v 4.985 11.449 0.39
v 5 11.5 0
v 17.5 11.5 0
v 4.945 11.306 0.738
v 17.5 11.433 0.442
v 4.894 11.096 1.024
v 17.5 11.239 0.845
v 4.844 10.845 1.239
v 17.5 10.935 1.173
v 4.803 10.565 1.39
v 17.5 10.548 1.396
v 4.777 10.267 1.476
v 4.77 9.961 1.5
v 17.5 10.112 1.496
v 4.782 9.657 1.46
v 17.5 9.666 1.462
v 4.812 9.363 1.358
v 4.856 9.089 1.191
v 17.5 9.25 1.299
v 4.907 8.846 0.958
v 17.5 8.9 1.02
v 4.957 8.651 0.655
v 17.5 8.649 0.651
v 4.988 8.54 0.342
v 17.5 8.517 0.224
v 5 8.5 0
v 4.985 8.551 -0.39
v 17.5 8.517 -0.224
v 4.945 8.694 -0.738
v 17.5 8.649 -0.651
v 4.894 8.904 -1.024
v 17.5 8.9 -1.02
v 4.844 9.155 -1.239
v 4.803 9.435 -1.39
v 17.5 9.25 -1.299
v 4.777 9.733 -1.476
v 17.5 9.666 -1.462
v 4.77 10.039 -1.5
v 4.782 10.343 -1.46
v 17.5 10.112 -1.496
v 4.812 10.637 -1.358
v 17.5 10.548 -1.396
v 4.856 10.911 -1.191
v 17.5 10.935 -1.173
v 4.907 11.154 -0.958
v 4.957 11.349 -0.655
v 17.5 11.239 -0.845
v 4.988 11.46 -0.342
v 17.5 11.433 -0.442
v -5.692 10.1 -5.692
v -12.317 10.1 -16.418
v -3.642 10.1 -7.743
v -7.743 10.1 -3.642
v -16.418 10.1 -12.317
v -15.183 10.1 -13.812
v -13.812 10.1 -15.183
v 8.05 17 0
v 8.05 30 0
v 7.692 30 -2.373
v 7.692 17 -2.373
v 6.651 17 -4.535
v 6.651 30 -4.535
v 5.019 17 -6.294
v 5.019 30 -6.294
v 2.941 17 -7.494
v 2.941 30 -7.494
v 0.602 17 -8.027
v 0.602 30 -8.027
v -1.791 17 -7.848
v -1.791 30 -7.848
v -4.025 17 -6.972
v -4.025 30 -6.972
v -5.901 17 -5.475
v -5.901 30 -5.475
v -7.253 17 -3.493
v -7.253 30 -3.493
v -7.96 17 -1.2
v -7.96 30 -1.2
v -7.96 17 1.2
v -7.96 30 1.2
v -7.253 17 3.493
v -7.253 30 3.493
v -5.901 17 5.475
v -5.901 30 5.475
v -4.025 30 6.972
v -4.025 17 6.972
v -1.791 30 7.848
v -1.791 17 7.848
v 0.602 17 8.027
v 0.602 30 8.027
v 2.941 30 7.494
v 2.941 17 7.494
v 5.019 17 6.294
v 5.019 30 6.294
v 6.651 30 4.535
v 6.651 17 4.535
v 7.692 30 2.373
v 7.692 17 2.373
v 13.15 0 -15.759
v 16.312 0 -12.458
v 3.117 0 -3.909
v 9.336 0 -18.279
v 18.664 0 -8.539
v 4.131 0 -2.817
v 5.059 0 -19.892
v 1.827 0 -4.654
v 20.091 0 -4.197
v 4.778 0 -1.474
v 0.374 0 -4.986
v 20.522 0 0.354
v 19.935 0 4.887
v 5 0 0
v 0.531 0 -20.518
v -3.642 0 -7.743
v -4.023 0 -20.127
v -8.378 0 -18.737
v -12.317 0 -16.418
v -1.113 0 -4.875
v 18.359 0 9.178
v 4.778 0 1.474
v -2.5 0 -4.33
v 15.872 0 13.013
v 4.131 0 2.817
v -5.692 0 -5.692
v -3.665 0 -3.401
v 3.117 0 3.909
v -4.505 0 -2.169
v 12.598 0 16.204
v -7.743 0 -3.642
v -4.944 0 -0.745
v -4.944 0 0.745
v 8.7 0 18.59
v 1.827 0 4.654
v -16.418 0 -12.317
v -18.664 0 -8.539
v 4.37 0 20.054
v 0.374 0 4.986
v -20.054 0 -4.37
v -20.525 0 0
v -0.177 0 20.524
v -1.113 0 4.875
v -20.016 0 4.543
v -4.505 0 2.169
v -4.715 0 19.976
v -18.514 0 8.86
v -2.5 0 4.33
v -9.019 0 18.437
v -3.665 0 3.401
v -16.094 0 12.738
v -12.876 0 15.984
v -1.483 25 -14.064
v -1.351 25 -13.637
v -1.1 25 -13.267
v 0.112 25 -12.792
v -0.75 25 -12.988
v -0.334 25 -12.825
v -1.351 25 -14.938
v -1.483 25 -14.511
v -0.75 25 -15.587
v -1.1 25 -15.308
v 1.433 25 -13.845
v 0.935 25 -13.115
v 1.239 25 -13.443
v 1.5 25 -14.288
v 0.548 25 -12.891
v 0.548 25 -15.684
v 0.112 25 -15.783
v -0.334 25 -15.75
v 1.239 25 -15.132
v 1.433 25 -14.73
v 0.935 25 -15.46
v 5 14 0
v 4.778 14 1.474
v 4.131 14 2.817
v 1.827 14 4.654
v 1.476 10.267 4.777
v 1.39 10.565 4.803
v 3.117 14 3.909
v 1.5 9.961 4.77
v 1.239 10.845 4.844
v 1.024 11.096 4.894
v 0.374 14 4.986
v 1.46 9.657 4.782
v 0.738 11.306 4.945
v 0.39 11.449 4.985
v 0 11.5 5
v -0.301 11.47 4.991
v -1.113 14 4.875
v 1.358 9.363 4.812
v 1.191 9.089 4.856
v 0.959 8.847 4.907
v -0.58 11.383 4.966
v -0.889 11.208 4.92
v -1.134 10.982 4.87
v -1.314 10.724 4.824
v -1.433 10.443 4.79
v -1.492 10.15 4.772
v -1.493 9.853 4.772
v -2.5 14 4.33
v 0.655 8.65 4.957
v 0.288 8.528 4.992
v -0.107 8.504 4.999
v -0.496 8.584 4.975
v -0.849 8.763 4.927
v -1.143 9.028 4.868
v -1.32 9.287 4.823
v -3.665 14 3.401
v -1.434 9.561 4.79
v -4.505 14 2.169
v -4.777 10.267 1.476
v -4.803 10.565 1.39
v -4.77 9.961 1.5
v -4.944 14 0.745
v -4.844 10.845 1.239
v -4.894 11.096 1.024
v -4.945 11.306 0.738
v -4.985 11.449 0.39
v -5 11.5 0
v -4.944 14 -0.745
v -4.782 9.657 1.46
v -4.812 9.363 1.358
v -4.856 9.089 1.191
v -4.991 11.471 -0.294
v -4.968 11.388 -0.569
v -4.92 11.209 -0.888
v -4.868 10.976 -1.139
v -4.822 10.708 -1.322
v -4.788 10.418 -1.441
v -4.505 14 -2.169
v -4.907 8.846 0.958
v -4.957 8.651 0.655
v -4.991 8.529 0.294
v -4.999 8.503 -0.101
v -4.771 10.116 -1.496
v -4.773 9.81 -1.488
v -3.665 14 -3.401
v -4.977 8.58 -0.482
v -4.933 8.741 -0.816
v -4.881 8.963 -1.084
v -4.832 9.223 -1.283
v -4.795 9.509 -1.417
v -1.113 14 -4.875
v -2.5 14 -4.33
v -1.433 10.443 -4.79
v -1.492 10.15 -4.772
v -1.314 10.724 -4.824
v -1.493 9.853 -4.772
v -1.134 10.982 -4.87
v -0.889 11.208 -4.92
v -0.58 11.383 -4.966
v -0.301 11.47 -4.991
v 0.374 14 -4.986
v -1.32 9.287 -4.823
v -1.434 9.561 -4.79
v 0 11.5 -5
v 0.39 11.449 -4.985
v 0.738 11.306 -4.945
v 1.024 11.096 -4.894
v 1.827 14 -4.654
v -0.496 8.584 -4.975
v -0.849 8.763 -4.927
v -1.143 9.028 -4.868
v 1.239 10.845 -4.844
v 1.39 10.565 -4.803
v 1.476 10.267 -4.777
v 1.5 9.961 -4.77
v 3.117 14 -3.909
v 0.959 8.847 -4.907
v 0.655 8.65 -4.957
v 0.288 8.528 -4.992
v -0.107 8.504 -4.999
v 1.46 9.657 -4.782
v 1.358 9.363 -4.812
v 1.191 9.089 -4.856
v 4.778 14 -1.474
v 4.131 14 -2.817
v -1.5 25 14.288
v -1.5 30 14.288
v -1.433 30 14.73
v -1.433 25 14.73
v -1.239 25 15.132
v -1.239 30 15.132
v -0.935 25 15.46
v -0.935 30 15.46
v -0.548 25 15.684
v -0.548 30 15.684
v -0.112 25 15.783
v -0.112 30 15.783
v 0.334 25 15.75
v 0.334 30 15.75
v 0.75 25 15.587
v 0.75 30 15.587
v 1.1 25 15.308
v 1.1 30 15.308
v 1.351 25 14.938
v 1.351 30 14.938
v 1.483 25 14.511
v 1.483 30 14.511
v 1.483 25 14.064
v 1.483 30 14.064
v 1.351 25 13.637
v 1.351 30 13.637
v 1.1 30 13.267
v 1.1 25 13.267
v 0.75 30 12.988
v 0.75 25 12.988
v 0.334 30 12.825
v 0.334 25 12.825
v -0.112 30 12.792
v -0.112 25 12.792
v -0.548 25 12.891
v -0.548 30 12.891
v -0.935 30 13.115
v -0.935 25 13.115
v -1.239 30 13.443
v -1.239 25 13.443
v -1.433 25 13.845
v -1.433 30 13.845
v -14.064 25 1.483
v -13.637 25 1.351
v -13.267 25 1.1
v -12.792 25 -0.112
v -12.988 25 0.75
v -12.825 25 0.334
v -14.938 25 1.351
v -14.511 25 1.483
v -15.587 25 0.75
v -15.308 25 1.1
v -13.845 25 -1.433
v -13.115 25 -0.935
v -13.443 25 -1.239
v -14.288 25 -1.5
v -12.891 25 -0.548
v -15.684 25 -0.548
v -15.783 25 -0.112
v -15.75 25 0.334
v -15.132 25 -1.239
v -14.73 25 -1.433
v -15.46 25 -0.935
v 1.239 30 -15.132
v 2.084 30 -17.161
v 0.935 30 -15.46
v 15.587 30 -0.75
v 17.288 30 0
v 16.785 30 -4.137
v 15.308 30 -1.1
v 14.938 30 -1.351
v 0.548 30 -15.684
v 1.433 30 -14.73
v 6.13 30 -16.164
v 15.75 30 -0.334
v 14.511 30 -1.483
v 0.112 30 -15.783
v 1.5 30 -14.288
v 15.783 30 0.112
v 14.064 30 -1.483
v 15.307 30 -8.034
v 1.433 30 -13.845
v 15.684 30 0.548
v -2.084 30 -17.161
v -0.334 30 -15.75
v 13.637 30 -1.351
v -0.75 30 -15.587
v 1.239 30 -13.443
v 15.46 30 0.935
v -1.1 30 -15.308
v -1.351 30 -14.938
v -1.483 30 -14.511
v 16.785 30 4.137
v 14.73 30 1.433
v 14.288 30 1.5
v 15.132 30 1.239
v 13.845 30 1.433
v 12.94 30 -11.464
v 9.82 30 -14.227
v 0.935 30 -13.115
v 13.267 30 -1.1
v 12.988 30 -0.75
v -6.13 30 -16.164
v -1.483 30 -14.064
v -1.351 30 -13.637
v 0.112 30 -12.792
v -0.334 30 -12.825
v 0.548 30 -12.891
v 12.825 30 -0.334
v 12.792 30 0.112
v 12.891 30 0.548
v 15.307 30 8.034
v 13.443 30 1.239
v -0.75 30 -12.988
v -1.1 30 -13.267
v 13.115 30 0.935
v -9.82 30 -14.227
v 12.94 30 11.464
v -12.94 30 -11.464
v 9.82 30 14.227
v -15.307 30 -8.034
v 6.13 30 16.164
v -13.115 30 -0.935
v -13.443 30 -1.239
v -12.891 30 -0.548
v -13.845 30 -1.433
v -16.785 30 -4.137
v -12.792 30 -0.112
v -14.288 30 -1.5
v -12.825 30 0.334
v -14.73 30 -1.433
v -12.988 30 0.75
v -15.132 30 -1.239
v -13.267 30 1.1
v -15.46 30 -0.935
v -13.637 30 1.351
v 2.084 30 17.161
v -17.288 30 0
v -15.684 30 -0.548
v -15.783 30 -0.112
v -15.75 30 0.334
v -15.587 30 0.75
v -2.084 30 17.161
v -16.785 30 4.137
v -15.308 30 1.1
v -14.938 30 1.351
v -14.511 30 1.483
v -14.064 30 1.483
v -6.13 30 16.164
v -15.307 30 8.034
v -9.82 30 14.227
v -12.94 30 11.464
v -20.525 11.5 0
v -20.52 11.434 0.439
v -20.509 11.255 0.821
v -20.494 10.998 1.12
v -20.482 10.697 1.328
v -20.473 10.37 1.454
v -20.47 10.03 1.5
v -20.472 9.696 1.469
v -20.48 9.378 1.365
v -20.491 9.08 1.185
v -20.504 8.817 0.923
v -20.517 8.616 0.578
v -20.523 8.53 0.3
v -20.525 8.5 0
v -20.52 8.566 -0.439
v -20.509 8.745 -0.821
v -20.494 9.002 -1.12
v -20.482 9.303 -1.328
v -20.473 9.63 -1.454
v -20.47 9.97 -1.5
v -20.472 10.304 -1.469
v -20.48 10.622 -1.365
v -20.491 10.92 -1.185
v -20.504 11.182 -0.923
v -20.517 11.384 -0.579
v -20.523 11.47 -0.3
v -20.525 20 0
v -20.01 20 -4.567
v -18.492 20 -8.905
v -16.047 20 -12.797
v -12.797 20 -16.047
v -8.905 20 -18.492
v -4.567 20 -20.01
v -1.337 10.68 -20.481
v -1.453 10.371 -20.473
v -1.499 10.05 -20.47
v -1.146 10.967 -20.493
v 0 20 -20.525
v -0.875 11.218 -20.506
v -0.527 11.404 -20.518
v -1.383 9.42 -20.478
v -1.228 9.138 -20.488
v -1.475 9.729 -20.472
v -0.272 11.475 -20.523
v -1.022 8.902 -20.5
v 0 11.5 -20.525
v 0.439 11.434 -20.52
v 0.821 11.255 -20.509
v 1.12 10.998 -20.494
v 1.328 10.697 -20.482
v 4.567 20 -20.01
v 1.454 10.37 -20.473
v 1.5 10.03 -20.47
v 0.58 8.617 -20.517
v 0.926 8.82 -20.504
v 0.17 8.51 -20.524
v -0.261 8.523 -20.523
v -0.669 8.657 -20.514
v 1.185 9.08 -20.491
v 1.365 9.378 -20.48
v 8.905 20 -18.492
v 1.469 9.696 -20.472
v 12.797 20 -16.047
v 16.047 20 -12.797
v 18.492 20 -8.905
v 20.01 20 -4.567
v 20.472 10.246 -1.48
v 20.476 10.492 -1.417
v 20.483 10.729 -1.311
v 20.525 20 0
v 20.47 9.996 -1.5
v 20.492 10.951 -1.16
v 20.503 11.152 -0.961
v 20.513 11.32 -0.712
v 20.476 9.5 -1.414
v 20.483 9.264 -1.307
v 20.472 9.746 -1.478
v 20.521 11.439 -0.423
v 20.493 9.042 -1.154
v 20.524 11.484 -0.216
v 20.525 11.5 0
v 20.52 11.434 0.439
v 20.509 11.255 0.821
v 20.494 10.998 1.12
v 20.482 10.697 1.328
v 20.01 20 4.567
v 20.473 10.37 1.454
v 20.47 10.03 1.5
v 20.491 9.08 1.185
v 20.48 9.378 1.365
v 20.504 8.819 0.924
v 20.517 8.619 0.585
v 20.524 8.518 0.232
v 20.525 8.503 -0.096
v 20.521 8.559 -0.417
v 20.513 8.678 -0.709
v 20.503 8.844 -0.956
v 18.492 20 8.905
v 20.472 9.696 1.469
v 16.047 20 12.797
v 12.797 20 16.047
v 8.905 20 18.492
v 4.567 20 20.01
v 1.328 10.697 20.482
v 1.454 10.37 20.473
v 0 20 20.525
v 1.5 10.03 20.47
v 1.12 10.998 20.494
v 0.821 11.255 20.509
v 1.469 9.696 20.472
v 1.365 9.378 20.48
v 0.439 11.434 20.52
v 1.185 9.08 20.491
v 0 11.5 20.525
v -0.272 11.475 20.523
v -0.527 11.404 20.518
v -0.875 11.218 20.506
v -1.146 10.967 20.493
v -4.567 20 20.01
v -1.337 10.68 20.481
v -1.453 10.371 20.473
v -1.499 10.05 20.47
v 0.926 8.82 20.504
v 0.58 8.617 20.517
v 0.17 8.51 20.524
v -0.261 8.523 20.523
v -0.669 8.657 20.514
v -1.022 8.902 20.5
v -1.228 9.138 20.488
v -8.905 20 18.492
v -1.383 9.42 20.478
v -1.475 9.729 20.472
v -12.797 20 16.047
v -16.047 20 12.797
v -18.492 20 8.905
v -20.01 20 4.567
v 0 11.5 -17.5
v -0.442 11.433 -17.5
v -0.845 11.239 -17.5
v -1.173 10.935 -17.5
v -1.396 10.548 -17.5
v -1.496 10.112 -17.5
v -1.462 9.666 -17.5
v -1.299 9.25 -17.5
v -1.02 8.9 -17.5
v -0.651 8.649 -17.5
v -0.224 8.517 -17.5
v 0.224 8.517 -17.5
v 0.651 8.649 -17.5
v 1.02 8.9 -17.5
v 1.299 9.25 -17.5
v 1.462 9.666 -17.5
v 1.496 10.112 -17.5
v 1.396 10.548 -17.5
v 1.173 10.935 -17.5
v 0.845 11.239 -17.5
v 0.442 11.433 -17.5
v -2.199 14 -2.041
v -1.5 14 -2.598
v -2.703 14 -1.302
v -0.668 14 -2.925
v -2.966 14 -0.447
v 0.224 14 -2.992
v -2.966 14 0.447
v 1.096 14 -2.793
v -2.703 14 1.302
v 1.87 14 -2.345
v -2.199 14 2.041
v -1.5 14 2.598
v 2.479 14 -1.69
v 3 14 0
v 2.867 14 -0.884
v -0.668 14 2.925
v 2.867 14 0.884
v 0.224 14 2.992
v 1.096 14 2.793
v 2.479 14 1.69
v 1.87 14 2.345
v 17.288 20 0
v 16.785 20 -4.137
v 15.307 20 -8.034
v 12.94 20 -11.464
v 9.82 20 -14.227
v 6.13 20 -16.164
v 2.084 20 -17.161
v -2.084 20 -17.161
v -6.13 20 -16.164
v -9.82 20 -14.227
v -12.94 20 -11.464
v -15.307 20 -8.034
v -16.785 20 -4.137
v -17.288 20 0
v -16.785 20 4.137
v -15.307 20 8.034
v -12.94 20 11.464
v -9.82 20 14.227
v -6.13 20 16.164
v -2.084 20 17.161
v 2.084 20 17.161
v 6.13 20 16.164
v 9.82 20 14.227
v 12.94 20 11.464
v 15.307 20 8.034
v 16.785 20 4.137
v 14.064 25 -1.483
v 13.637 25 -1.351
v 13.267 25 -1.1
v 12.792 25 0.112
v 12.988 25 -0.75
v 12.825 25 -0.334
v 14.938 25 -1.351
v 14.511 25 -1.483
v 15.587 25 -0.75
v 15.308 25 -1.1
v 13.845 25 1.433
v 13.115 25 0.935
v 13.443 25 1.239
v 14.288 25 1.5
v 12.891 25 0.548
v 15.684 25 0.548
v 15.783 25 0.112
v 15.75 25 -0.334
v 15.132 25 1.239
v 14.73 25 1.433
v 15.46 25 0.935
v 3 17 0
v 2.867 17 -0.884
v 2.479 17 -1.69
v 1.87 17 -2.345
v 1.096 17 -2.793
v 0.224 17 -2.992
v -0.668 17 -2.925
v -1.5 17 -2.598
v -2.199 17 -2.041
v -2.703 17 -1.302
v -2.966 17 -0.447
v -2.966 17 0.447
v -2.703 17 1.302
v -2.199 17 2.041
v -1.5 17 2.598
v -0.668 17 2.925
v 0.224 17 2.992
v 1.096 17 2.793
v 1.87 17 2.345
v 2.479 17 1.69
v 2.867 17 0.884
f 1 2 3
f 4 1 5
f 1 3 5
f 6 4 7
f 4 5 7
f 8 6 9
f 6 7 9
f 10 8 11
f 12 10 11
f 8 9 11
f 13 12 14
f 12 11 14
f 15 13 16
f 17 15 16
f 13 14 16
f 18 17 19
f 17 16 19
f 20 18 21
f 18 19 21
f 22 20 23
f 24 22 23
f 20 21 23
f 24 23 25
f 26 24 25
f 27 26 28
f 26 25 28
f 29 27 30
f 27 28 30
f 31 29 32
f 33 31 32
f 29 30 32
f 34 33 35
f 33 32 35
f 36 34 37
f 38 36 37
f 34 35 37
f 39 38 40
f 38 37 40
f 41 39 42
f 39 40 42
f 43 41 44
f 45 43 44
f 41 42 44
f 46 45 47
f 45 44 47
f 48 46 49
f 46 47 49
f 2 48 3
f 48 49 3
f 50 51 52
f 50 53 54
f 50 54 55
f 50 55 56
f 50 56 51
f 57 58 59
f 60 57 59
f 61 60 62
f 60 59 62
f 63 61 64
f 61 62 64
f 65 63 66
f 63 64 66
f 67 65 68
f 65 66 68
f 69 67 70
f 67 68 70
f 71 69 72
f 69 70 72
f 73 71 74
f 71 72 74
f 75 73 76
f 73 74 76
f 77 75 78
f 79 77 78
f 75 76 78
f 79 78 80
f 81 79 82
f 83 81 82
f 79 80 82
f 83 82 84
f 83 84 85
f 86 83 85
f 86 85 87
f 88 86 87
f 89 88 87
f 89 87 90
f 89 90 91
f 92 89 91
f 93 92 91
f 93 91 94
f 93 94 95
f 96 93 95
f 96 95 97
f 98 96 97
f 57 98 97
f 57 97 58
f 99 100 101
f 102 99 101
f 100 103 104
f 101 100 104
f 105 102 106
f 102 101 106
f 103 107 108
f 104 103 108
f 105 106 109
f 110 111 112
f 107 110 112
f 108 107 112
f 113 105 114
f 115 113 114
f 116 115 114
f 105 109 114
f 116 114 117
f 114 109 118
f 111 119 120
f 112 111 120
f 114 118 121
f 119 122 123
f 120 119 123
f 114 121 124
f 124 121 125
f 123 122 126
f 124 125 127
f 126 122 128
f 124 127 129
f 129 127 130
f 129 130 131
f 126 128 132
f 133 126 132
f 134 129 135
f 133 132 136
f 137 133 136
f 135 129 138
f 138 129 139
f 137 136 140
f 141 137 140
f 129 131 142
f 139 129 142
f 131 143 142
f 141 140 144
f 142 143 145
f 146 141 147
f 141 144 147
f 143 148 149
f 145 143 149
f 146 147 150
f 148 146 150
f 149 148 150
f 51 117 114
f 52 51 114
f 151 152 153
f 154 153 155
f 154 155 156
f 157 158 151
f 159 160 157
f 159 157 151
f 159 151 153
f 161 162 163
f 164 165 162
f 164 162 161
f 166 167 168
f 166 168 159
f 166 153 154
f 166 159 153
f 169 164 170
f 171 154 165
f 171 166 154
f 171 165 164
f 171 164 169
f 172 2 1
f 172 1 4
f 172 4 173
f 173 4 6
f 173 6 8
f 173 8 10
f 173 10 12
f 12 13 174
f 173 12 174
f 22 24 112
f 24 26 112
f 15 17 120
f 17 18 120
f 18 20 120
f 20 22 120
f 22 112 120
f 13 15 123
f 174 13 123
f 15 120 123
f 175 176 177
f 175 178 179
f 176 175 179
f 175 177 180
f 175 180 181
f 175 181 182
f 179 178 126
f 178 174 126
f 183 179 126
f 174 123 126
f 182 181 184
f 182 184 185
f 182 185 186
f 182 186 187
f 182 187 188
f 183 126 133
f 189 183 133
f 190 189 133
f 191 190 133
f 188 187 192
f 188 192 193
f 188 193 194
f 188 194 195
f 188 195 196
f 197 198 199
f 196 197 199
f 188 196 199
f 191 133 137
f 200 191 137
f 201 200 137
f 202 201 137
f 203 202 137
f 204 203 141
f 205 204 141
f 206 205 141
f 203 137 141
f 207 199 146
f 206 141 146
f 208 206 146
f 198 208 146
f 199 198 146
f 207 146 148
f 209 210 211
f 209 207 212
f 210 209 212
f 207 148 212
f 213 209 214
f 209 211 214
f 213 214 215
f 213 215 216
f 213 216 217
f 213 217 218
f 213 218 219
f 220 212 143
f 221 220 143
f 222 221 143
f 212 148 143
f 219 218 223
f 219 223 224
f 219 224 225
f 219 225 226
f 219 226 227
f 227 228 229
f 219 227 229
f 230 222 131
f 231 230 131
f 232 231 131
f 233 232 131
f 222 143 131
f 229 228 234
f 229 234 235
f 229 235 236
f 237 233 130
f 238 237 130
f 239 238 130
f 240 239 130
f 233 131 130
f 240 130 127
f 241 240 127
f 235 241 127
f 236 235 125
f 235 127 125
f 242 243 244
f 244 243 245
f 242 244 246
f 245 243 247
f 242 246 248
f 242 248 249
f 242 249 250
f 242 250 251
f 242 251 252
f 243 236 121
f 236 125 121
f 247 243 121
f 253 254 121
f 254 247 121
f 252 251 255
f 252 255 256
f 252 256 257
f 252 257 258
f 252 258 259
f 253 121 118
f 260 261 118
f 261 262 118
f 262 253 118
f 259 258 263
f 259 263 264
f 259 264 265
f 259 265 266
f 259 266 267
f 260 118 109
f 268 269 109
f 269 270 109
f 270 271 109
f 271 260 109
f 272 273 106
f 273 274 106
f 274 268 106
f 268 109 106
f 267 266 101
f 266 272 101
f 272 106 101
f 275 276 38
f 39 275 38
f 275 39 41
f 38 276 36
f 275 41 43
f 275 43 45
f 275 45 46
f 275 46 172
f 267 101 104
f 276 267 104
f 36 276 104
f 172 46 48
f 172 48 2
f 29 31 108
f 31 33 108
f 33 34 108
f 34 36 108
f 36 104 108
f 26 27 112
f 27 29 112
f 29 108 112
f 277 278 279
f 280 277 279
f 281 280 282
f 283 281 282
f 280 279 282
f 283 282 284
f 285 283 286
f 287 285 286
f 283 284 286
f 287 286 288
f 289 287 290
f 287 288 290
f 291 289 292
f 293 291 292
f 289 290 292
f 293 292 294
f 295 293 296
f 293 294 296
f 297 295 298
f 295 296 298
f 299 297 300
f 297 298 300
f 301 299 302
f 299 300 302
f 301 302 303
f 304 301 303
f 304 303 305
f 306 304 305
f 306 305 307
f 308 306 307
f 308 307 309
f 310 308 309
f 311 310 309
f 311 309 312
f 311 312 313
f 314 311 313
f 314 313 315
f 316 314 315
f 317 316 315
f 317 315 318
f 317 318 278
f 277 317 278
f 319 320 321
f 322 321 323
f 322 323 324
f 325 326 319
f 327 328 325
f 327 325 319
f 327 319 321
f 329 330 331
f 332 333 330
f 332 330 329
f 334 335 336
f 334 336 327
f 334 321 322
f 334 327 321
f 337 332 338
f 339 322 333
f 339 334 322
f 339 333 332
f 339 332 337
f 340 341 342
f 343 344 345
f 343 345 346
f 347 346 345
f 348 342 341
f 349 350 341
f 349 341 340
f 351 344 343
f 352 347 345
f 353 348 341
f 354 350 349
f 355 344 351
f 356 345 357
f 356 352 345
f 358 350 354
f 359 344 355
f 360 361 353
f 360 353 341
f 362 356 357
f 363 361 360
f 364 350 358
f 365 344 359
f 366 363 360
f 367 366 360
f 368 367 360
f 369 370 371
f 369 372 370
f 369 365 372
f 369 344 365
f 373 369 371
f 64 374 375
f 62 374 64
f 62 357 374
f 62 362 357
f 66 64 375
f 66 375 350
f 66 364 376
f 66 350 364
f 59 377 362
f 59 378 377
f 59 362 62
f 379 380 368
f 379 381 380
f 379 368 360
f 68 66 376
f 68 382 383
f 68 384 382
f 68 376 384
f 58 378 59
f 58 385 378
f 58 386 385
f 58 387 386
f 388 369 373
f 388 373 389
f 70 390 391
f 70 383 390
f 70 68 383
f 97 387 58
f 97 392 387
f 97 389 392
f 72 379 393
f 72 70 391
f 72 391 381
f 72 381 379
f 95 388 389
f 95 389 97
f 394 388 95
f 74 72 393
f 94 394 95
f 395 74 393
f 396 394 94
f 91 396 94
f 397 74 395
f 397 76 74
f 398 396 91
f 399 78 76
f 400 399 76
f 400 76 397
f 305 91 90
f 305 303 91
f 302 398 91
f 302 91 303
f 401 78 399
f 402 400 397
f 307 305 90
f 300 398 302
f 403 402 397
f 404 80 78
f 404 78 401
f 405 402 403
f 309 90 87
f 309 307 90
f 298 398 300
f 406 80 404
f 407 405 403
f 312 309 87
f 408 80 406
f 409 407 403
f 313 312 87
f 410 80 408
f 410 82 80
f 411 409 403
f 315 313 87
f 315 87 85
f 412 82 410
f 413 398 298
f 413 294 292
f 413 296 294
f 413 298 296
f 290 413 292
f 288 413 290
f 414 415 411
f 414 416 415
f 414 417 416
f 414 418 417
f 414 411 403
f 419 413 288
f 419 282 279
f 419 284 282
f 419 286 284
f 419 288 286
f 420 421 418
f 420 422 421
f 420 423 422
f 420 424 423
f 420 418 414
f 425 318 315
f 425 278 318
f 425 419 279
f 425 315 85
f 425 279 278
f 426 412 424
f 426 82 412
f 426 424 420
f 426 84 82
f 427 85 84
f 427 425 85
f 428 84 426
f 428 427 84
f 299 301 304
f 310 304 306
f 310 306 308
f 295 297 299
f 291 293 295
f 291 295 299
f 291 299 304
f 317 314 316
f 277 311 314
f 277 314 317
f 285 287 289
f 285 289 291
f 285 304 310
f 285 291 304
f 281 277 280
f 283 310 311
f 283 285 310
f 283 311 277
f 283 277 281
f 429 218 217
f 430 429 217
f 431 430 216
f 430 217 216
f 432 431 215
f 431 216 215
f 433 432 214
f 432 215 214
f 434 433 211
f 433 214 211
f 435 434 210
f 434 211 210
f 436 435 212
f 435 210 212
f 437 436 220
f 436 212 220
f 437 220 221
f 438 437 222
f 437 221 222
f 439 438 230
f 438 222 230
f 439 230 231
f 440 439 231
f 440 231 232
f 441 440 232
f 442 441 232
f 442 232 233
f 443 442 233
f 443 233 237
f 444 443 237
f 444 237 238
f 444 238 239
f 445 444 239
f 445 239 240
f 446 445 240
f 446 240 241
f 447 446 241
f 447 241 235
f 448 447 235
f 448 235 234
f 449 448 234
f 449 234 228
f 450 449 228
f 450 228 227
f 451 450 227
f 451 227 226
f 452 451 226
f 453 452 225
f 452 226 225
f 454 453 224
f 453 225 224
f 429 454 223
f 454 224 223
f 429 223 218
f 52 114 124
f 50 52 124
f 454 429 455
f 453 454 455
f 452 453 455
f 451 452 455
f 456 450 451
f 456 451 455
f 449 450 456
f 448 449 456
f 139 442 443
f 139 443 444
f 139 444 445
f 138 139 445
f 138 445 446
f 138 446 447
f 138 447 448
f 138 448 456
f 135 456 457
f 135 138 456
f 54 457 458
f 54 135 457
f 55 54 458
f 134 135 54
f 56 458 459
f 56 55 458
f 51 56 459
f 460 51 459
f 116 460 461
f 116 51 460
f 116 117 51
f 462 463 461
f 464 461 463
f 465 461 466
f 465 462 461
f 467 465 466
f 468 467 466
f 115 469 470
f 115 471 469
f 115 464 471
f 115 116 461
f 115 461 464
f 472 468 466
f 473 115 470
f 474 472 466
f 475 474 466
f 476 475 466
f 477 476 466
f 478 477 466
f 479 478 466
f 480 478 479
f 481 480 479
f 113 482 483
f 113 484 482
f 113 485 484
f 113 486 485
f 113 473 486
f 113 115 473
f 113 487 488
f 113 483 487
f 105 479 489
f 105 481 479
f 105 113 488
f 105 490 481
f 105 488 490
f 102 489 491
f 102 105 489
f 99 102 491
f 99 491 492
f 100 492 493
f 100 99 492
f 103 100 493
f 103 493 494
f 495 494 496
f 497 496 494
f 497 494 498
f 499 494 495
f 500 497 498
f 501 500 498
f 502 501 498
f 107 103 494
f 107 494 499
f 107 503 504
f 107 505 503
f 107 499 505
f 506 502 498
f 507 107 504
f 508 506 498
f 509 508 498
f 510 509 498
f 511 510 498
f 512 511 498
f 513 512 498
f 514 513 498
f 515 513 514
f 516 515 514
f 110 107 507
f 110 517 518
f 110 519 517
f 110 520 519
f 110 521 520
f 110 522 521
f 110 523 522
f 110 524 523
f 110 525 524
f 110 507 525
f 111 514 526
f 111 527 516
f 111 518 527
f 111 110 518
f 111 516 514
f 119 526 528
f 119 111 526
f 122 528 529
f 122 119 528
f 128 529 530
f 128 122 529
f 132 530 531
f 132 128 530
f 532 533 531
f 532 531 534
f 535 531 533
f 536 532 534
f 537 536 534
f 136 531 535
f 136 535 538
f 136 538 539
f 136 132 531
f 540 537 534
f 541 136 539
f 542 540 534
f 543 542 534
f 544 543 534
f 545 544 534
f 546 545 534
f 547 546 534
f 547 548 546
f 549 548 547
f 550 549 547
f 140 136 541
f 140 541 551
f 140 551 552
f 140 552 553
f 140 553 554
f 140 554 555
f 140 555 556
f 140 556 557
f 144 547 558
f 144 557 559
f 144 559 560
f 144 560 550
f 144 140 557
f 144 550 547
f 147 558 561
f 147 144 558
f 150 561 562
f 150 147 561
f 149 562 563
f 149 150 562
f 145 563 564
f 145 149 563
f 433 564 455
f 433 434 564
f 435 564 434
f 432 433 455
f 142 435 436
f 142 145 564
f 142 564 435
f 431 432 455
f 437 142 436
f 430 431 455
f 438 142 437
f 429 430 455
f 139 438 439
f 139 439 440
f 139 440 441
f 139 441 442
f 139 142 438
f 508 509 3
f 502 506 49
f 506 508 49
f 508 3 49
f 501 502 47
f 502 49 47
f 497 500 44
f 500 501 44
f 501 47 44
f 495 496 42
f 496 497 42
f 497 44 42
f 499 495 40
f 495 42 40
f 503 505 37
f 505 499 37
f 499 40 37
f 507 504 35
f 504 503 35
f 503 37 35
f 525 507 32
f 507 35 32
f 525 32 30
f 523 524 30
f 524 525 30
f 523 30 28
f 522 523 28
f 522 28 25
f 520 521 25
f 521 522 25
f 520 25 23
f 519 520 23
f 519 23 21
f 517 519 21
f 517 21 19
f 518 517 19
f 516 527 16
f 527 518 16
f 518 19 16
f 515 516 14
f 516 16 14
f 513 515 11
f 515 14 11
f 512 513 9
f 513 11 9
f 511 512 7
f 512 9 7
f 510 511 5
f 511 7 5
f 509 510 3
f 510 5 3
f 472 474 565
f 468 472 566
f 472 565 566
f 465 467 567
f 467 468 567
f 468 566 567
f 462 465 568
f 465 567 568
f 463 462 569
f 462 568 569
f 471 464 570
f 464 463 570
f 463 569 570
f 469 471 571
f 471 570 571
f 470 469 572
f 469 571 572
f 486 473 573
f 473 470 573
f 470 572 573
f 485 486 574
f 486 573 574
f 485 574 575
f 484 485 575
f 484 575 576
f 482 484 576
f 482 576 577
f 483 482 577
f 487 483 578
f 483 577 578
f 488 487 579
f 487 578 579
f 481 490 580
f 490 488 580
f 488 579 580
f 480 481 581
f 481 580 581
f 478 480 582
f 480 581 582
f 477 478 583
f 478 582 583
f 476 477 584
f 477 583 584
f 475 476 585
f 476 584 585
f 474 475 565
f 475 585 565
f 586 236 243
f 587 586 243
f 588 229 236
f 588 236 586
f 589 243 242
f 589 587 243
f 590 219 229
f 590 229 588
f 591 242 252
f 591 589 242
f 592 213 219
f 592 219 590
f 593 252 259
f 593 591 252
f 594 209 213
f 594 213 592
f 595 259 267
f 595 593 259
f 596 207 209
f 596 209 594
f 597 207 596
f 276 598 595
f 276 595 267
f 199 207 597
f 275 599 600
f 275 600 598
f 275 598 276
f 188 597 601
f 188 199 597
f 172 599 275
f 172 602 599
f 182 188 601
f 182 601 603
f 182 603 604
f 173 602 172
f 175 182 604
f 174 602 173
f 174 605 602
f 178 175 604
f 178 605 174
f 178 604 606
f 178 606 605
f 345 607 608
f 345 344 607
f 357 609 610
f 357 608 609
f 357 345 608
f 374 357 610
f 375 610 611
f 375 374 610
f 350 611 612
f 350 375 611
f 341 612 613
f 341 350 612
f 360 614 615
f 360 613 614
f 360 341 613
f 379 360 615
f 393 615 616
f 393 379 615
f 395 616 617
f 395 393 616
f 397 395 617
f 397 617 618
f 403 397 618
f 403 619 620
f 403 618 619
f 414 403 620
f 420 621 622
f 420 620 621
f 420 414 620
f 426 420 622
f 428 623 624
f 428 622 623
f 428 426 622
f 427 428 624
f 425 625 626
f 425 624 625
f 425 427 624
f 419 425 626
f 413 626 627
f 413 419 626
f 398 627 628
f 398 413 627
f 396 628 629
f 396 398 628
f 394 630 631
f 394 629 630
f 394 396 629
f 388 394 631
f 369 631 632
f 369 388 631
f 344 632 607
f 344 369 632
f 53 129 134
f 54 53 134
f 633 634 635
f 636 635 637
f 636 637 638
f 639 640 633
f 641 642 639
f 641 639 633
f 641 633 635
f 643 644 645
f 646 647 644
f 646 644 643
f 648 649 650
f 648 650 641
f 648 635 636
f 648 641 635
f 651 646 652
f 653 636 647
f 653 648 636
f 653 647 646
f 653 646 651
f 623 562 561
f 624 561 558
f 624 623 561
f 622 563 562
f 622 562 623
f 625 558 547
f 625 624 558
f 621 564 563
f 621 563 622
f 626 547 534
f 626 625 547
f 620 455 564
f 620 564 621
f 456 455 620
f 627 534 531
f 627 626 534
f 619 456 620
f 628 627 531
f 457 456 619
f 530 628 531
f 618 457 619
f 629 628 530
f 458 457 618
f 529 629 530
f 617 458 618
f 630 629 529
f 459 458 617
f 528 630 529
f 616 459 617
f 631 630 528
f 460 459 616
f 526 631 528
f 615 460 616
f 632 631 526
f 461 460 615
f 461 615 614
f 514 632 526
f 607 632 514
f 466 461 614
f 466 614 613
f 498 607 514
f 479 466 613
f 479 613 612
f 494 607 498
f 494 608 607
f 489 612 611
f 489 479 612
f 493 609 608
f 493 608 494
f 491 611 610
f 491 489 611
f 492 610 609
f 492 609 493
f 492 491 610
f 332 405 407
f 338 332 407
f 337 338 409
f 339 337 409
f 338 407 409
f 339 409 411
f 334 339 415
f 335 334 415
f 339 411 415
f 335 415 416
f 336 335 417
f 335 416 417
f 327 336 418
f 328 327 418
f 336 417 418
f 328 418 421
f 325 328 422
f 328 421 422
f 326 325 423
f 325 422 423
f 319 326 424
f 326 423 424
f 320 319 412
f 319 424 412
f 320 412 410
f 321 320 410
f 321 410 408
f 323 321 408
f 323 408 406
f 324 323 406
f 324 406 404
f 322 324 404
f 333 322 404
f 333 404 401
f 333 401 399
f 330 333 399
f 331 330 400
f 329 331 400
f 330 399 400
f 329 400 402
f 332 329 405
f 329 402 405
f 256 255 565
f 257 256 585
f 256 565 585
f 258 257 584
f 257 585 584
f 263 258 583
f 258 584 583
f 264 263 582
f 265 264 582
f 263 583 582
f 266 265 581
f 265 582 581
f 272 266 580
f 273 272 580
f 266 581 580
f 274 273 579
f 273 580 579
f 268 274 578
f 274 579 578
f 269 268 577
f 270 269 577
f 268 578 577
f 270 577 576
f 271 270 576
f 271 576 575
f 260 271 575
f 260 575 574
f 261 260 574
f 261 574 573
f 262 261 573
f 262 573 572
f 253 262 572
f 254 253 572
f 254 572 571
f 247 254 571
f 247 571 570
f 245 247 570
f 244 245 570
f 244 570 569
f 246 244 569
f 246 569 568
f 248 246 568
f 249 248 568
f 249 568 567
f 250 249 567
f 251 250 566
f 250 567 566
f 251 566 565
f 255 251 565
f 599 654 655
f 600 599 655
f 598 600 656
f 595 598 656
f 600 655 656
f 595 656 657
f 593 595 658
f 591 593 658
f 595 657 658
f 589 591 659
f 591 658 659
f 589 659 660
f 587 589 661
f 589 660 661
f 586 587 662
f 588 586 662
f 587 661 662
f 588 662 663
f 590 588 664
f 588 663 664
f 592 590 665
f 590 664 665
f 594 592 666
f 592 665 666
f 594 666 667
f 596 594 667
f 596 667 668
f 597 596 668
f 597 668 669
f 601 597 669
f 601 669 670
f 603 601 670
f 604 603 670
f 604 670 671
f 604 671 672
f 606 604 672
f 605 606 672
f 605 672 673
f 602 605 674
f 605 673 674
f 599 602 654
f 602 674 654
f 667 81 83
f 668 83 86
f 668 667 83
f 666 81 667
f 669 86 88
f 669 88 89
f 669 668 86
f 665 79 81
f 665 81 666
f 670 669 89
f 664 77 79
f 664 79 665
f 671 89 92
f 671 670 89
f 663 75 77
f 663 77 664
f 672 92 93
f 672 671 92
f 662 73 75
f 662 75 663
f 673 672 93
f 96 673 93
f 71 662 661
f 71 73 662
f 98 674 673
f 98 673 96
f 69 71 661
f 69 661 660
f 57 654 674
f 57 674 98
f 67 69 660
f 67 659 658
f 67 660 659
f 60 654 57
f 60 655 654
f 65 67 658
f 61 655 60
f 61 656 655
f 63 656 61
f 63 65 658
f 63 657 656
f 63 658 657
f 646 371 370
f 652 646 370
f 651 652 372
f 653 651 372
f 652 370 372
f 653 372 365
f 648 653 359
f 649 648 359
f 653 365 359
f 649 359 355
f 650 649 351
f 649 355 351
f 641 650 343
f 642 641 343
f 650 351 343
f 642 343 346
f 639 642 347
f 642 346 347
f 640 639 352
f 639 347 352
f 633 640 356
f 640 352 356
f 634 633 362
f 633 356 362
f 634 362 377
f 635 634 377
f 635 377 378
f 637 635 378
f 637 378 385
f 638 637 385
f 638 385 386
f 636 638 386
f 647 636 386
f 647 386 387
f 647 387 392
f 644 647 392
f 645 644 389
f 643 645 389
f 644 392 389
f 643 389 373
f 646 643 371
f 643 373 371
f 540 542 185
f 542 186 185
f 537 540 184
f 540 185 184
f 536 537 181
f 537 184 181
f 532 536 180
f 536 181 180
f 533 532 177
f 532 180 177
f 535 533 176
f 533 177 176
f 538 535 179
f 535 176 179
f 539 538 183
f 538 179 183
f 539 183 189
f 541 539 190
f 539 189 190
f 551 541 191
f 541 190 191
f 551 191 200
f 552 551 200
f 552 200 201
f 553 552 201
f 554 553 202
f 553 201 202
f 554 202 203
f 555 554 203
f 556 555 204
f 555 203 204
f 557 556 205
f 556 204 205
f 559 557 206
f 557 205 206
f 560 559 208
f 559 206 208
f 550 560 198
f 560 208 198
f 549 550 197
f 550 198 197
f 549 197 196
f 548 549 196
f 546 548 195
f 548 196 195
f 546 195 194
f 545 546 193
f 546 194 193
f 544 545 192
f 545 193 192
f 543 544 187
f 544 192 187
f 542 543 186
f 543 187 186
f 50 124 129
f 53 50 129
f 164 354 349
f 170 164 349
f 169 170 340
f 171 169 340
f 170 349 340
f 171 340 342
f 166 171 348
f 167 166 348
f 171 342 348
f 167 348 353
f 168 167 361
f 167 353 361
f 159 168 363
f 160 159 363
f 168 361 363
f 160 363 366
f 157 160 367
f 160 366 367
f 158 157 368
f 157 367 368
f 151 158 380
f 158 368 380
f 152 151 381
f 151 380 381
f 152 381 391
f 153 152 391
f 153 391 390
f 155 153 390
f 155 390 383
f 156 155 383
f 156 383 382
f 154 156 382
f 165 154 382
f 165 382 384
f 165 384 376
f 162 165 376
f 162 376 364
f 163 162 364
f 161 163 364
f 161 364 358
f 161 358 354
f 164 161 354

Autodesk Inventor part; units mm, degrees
ref_plane "XZ Plane" through (0, 0, 0) normal (0, 1, 0) x (-1, 0, 0)
ref_plane "XY Plane" through (0, 0, 0) normal (0, 0, 1) x (1, 0, 0)
sketch "Sketch1" plane through (0, 0, 0) normal (0, 1, 0) x (-1, 0, 0)
  circle A0 centre (0, 0) radius 20.525
extrude "Extrusion1" add sketch "Sketch1" along normal blind 30
sketch "Sketch2" plane through (0, 30, 0) normal (0, 1, 0) x (1, 0, 0)
  circle A0 centre (0, 0) radius 8.05
  dimension "d3" = 16.1
extrude "Extrusion2" cut sketch "Sketch2" against normal blind 13
sketch "Sketch4" plane through (0, 17, 0) normal (0, 1, 0) x (1, 0, 0)
  circle A0 centre (0, 0) radius 3
  dimension "d27" = 6
sketch "Sketch5" plane through (0, 30, 0) normal (0, 1, 0) x (1, 0, 0)
  circle A0 centre (0, 0) radius 8.05 projected
  circle A1 centre (0, 0) radius 20.525 projected
  circle A2 centre (0, 14.2875) radius 1.5
extrude "Extrusion5" cut sketch "Sketch5" against normal blind 5 contours A2
pattern_circular "Circular Pattern2" count 4 over 360 about axis through (0, 0, 0) along (0, 1, 0) of "Extrusion5"
sketch "Sketch6" plane through (0, 30, 0) normal (0, 1, 0) x (1, 0, 0)
  circle A0 centre (0, 14.2875) radius 1.5 projected
  line L0 (0, 15.7875) -> (0, 17.2875)
  circle A1 centre (0, 0) radius 17.2875
  circle A2 centre (0, 0) radius 20.525 projected
  dimension "d22" = 1.5
extrude "Extrusion6" cut sketch "Sketch6" against normal blind 10 contours A2
extrude "Extrusion7" cut sketch "Sketch4" against normal blind 10
sketch "Sketch7" plane through (0, 0, 0) normal (0, -1, 0) x (1, 0, 0)
  circle A0 centre (0, 0) radius 5
  dimension "d28" = 10
extrude "Extrusion8" cut sketch "Sketch7" against normal blind 14
sketch "Sketch8" plane through (0, 30, 0) normal (0, 1, 0) x (1, 0, 0)
  circle A0 centre (0, 0) radius 17.2875 projected
  circle A1 centre (14.2875, 0) radius 1.5 projected
  circle A2 centre (0, -14.2875) radius 1.5 projected
  circle A3 centre (-14.2875, 0) radius 1.5 projected
  circle A4 centre (0, 14.2875) radius 1.5 projected
  circle A5 centre (0, 0) radius 8.05 projected
ref_plane "Work Plane1" through (17.5, 0, 0) normal (1, 0, 0) x (0, 1, 0)
sketch "Sketch9" plane through (17.5, 0, 0) normal (1, 0, 0) x (0, 1, 0)
  circle A0 centre (10, 0) radius 1.5
  dimension "d32" = 3
extrude "Extrusion9" cut sketch "Sketch9" along normal blind 50 and the other way blind 50
pattern_circular "Circular Pattern3" count 4 over 360 about axis through (0, 0, 0) along (0, 1, 0) of "Extrusion9"
sketch "Sketch10" plane through (0, 0, 0) normal (0, -1, 0) x (1, 0, 0)
  line L0 (-5.6922, -5.6922) -> (-7.7428, -3.6416)
  line L1 (-7.7428, -3.6416) -> (-18.2787, -14.1775)
  line L2 (-18.2787, -14.1775) -> (-14.1775, -18.2787)
  line L3 (-14.1775, -18.2787) -> (-3.6416, -7.7428)
  line L4 (-3.6416, -7.7428) -> (-5.6922, -5.6922)
  point P0 (0, 0)
extrude "Extrusion10" cut sketch "Sketch10" against normal blind 10.1
properties part number "tutup_syringe"
